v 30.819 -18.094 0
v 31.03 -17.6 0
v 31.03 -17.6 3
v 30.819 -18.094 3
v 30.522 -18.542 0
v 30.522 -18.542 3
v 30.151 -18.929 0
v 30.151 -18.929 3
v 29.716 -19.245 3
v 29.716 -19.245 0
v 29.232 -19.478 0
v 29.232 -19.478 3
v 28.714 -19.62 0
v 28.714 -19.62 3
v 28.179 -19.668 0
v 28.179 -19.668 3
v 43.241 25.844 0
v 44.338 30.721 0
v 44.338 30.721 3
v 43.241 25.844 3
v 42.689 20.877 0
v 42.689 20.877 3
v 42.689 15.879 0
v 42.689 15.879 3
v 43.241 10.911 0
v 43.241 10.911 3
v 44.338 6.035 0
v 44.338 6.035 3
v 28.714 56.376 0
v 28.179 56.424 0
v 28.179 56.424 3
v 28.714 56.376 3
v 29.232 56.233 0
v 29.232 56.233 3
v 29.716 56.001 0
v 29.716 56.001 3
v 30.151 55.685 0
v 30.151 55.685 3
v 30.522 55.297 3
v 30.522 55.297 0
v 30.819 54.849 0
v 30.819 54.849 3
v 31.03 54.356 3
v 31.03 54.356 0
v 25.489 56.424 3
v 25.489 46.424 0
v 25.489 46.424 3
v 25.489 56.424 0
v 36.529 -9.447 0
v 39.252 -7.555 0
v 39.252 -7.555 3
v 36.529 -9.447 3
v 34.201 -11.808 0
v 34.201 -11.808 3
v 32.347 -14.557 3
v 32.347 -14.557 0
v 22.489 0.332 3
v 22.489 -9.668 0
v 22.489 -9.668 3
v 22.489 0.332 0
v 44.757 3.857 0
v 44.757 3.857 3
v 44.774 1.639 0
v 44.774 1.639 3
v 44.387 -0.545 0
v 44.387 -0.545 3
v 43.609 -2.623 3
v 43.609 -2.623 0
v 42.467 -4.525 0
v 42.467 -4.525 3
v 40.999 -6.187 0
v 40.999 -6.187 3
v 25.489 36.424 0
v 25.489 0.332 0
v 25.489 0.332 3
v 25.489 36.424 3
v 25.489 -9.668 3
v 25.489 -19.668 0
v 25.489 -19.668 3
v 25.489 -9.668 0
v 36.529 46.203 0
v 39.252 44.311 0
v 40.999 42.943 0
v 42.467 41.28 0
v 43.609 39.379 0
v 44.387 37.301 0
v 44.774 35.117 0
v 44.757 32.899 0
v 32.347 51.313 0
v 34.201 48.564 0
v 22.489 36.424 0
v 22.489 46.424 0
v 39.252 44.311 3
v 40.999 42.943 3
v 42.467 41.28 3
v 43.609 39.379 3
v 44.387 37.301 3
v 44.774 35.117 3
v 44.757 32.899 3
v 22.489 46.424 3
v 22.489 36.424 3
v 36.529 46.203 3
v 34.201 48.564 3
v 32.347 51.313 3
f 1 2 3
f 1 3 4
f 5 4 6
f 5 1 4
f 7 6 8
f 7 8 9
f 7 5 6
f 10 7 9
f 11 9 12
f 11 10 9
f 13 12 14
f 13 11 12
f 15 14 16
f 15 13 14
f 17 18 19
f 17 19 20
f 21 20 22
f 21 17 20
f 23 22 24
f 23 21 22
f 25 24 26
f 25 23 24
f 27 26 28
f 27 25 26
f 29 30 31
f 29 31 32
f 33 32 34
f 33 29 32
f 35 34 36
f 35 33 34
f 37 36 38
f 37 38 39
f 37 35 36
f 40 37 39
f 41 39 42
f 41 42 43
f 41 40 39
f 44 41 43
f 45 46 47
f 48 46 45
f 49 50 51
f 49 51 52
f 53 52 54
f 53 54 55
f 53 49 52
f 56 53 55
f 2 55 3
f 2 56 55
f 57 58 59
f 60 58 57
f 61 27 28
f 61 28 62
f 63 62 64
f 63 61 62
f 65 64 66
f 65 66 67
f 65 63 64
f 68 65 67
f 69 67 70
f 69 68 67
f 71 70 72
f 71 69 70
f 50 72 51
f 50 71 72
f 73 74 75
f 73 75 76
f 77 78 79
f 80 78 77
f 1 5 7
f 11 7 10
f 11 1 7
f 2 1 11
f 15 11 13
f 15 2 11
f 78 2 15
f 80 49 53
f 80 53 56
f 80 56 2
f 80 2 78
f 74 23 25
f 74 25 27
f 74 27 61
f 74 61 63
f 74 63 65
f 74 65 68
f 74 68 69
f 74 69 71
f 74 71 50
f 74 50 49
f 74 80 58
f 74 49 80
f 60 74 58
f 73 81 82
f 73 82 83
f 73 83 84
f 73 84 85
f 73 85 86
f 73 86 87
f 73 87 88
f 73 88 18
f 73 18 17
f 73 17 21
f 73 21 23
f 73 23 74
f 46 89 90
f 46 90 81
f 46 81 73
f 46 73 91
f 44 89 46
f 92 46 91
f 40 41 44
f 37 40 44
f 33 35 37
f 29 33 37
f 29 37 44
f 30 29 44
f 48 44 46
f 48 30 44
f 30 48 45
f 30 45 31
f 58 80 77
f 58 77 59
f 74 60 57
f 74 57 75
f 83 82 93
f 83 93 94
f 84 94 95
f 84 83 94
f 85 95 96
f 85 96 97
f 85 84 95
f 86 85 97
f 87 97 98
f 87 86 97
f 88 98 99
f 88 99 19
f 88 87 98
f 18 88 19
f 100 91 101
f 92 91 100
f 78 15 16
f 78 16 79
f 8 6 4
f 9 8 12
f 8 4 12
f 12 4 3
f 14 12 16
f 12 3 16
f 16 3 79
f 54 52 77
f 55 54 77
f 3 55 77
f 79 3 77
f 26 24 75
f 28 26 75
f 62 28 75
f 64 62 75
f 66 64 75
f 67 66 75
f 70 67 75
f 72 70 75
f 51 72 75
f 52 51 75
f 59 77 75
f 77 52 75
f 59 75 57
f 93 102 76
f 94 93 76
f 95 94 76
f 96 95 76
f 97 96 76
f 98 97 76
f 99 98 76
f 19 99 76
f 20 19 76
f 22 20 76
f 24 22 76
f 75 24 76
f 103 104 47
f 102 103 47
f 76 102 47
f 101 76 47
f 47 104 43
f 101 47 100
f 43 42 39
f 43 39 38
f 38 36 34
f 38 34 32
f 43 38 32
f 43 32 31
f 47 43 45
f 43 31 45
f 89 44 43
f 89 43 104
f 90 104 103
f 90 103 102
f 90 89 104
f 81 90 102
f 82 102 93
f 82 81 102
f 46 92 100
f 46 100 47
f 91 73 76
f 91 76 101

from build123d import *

# Parameters (mm, degrees)
SALIENTE_EXTRUIR1_DEPTH = 3


with BuildPart() as part:
    # Model → Saliente-Extruir1 (new body)
    with BuildSketch(Plane.XY):
        with BuildLine():
            Line((25.488716275, 56.424131461), (28.178792169, 56.424131461))
            ThreePointArc((28.178792169, 56.424131461), (29.940174662, 55.85261488), (31.030450954, 54.355819272))
            ThreePointArc((31.030450954, 54.355819272), (34.201179997, 48.563621322), (39.252486332, 44.310694794))
            ThreePointArc((39.252486332, 44.310694794), (44.045367232, 38.357656573), (44.338099173, 30.720596968))
            ThreePointArc((44.338099173, 30.720596968), (42.619326371, 18.377856), (44.338099173, 6.035115032))
            ThreePointArc((44.338099173, 6.035115032), (44.045367232, -1.601944573), (39.252486332, -7.554982794))
            ThreePointArc((39.252486332, -7.554982794), (34.201179997, -11.807909322), (31.030450954, -17.600107272))
            ThreePointArc((31.030450954, -17.600107272), (29.940174662, -19.09690288), (28.178792169, -19.668419461))
            Line((28.178792169, -19.668419461), (25.488716275, -19.668419461))
            Line((25.488716275, -19.668419461), (25.488716275, -9.668419461))
            Line((25.488716275, -9.668419461), (22.488716275, -9.668419461))
            Line((22.488716275, -9.668419461), (22.488716275, 0.331580539))
            Line((22.488716275, 0.331580539), (25.488716275, 0.331580539))
            Line((25.488716275, 0.331580539), (25.488716275, 36.424131461))
            Line((25.488716275, 36.424131461), (22.488716275, 36.424131461))
            Line((22.488716275, 36.424131461), (22.488716275, 46.424131461))
            Line((22.488716275, 46.424131461), (25.488716275, 46.424131461))
            Line((25.488716275, 46.424131461), (25.488716275, 56.424131461))
        make_face()
    extrude(amount=SALIENTE_EXTRUIR1_DEPTH)


solid = part.part
